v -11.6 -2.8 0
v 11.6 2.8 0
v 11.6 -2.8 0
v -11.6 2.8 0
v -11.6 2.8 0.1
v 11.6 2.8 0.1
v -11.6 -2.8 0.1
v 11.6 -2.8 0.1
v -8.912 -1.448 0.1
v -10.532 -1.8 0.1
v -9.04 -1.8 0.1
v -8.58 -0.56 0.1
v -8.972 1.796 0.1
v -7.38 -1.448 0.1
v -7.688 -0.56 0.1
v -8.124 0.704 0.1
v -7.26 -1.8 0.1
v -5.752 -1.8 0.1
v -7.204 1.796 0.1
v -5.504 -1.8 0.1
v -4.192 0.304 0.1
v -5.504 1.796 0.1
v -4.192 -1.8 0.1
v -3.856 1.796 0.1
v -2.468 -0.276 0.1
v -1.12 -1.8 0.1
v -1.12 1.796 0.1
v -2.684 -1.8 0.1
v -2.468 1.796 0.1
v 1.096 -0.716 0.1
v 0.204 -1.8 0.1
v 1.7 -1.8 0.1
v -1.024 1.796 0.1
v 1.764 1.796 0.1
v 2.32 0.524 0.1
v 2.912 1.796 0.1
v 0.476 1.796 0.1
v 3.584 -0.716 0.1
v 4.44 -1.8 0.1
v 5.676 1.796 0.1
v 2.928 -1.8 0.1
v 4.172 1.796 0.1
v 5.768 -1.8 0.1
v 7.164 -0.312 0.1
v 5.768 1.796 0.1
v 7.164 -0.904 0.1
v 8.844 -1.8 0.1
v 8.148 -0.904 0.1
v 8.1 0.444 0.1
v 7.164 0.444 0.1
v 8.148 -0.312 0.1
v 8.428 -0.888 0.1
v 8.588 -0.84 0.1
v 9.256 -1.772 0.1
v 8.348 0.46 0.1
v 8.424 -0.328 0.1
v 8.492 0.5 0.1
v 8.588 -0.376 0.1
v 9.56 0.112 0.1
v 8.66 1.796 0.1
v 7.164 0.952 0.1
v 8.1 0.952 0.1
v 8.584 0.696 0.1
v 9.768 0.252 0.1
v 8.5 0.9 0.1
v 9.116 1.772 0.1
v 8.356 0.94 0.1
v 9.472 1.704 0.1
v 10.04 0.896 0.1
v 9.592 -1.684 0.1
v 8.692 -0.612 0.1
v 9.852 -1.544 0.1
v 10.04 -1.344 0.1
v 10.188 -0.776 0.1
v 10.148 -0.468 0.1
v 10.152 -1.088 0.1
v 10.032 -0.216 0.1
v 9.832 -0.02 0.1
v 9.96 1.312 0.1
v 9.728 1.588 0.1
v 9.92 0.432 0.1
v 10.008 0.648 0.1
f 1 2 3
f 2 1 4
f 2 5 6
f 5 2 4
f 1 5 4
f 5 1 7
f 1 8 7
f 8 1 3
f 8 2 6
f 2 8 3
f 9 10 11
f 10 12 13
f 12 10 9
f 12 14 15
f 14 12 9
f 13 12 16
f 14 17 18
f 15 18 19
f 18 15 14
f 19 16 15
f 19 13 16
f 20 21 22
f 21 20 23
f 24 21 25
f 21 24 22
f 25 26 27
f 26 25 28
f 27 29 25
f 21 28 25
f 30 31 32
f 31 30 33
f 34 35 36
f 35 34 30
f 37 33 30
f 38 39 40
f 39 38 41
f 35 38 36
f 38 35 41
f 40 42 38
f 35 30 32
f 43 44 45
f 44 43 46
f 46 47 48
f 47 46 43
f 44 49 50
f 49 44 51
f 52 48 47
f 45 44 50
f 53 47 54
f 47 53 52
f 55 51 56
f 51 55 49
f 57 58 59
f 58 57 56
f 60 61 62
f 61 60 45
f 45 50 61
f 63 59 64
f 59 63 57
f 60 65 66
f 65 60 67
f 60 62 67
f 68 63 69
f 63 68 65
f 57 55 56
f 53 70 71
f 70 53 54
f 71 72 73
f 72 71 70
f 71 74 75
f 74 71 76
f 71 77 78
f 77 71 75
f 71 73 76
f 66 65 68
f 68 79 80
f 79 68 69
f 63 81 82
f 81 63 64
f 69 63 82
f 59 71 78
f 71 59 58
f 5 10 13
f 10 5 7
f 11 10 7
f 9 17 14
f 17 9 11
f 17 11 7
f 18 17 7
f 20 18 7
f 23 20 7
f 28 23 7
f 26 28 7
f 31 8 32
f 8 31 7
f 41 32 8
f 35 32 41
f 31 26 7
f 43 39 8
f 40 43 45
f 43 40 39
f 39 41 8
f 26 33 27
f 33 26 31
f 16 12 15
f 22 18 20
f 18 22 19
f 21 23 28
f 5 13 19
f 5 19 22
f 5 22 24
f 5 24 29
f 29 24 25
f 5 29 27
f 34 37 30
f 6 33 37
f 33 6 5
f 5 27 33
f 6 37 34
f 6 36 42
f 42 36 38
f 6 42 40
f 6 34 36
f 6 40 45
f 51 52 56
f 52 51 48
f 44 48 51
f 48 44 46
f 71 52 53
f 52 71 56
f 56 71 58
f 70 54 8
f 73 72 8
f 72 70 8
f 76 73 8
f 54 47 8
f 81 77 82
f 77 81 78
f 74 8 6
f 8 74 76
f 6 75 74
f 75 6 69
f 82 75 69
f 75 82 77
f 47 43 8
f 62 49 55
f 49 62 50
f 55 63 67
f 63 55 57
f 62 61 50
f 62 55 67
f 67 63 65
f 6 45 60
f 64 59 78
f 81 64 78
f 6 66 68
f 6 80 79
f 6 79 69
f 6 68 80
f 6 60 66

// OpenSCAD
// file: ../p/box5-12.scad
use <../lib.scad>
function ldraw_lib__box5_12() = [
// 0 Box with 5 Faces without Any Edges
// 0 Name: box5-12.dat
// 0 Author: Chris Dee [cwdee]
// 0 !LDRAW_ORG Primitive UPDATE 2009-02
// 0 !LICENSE Licensed under CC BY 2.0 and CC BY 4.0 : see CAreadme.txt
// 
// 0 BFC CERTIFY CCW
  [0,"BFC","CERTIFY"],
  [0,"BFC","CCW"],
// 
// 0 !HISTORY 2009-09-03 [PTadmin] Official Update 2009-02
// 
// 
// 4 16 1 1 1 1 1 -1 -1 1 -1 -1 1 1
  [4,16,1,1,1,1,1,-1,-1,1,-1,-1,1,1],
// 4 16 -1 0 1 1 0 1 1 1 1 -1 1 1
  [4,16,-1,0,1,1,0,1,1,1,1,-1,1,1],
// 4 16 -1 0 -1 -1 0 1 -1 1 1 -1 1 -1
  [4,16,-1,0,-1,-1,0,1,-1,1,1,-1,1,-1],
// 4 16 1 0 -1 -1 0 -1 -1 1 -1 1 1 -1
  [4,16,1,0,-1,-1,0,-1,-1,1,-1,1,1,-1],
// 4 16 1 0 1 1 0 -1 1 1 -1 1 1 1
  [4,16,1,0,1,1,0,-1,1,1,-1,1,1,1],
// 0
];
module ldraw_lib__box5_12(step=0, col=false, unit=2/5, alt=false, line=0.2, solid=!$preview)
    makepoly(ldraw_lib__box5_12(), step=step, col=col, unit=unit, alt=alt, line=line, solid=solid);
ldraw_lib__box5_12(line=0.2);
// main file
use <../lib.scad>
use <../p/box5-12.scad>
function ldraw_lib__194535e() = [
// 0 Sticker  0.7 x  2.9 with Black "ANWB" on Transparent Background
// 0 Name: 194535e.dat
// 0 Author: Takeshi Takahashi [RainbowDolphin]
// 0 !LDRAW_ORG Part UPDATE 2023-01
// 0 !LICENSE Licensed under CC BY 2.0 and CC BY 4.0 : see CAreadme.txt
// 
// 0 BFC CERTIFY CCW
  [0,"BFC","CERTIFY"],
  [0,"BFC","CCW"],
// 
// 0 !KEYWORDS Bricklink 1590.2stk01, Brickowl 599539, Netherlands
// 0 !KEYWORDS Rebrickable 194535, Road service, Set 1590-2
// 
// 0 !HISTORY 2023-03-05 [OrionP] Official Update 2023-01
// 
// 
// 1 16 0 -0.25 0 29 0 0 0 0.25 0 0 0 7 box5-12.dat
  [1,16,0,-0.25,0,29,0,0,0,0.25,0,0,0,7, ldraw_lib__box5_12()],
// 0 BFC NOCLIP
  [0,"BFC","NOCLIP"],
// 3 0 -22.28 -0.25 -3.62 -26.33 -0.25 -4.5 -22.6 -0.25 -4.5
  [3,0,-22.28,-0.25,-3.62,-26.33,-0.25,-4.5,-22.6,-0.25,-4.5],
// 4 0 -21.45 -0.25 -1.4 -22.43 -0.25 4.49 -26.33 -0.25 -4.5 -22.28 -0.25 -3.62
  [4,0,-21.45,-0.25,-1.4,-22.43,-0.25,4.49,-26.33,-0.25,-4.5,-22.28,-0.25,-3.62],
// 4 0 -21.45 -0.25 -1.4 -22.28 -0.25 -3.62 -18.45 -0.25 -3.62 -19.22 -0.25 -1.4
  [4,0,-21.45,-0.25,-1.4,-22.28,-0.25,-3.62,-18.45,-0.25,-3.62,-19.22,-0.25,-1.4],
// 3 0 -22.43 -0.25 4.49 -21.45 -0.25 -1.4 -20.31 -0.25 1.76
  [3,0,-22.43,-0.25,4.49,-21.45,-0.25,-1.4,-20.31,-0.25,1.76],
// 3 0 -18.45 -0.25 -3.62 -18.15 -0.25 -4.5 -14.38 -0.25 -4.5
  [3,0,-18.45,-0.25,-3.62,-18.15,-0.25,-4.5,-14.38,-0.25,-4.5],
// 4 0 -19.22 -0.25 -1.4 -18.45 -0.25 -3.62 -14.38 -0.25 -4.5 -18.01 -0.25 4.49
  [4,0,-19.22,-0.25,-1.4,-18.45,-0.25,-3.62,-14.38,-0.25,-4.5,-18.01,-0.25,4.49],
// 3 0 -18.01 -0.25 4.49 -20.31 -0.25 1.76 -19.22 -0.25 -1.4
  [3,0,-18.01,-0.25,4.49,-20.31,-0.25,1.76,-19.22,-0.25,-1.4],
// 3 0 -18.01 -0.25 4.49 -22.43 -0.25 4.49 -20.31 -0.25 1.76
  [3,0,-18.01,-0.25,4.49,-22.43,-0.25,4.49,-20.31,-0.25,1.76],
// 4 0 -13.76 -0.25 -4.5 -10.48 -0.25 -4.5 -10.48 -0.25 0.76 -13.76 -0.25 4.49
  [4,0,-13.76,-0.25,-4.5,-10.48,-0.25,-4.5,-10.48,-0.25,0.76,-13.76,-0.25,4.49],
// 4 0 -9.64 -0.25 4.49 -13.76 -0.25 4.49 -10.48 -0.25 0.76 -6.17 -0.25 -0.69
  [4,0,-9.64,-0.25,4.49,-13.76,-0.25,4.49,-10.48,-0.25,0.76,-6.17,-0.25,-0.69],
// 4 0 -6.17 -0.25 -0.69 -6.71 -0.25 -4.5 -2.8 -0.25 -4.5 -2.8 -0.25 4.49
  [4,0,-6.17,-0.25,-0.69,-6.71,-0.25,-4.5,-2.8,-0.25,-4.5,-2.8,-0.25,4.49],
// 3 0 -2.8 -0.25 4.49 -6.17 -0.25 4.49 -6.17 -0.25 -0.69
  [3,0,-2.8,-0.25,4.49,-6.17,-0.25,4.49,-6.17,-0.25,-0.69],
// 3 0 -10.48 -0.25 0.76 -6.71 -0.25 -4.5 -6.17 -0.25 -0.69
  [3,0,-10.48,-0.25,0.76,-6.71,-0.25,-4.5,-6.17,-0.25,-0.69],
// 4 0 0.51 -0.25 -4.5 4.25 -0.25 -4.5 2.74 -0.25 -1.79 -2.56 -0.25 4.49
  [4,0,0.51,-0.25,-4.5,4.25,-0.25,-4.5,2.74,-0.25,-1.79,-2.56,-0.25,4.49],
// 4 0 4.41 -0.25 4.49 2.74 -0.25 -1.79 5.8 -0.25 1.31 7.28 -0.25 4.49
  [4,0,4.41,-0.25,4.49,2.74,-0.25,-1.79,5.8,-0.25,1.31,7.28,-0.25,4.49],
// 3 0 1.19 -0.25 4.49 -2.56 -0.25 4.49 2.74 -0.25 -1.79
  [3,0,1.19,-0.25,4.49,-2.56,-0.25,4.49,2.74,-0.25,-1.79],
// 4 0 8.96 -0.25 -1.79 7.32 -0.25 -4.5 11.1 -0.25 -4.5 14.19 -0.25 4.49
  [4,0,8.96,-0.25,-1.79,7.32,-0.25,-4.5,11.1,-0.25,-4.5,14.19,-0.25,4.49],
// 4 0 5.8 -0.25 1.31 7.32 -0.25 -4.5 8.96 -0.25 -1.79 7.28 -0.25 4.49
  [4,0,5.8,-0.25,1.31,7.32,-0.25,-4.5,8.96,-0.25,-1.79,7.28,-0.25,4.49],
// 3 0 14.19 -0.25 4.49 10.43 -0.25 4.49 8.96 -0.25 -1.79
  [3,0,14.19,-0.25,4.49,10.43,-0.25,4.49,8.96,-0.25,-1.79],
// 3 0 5.8 -0.25 1.31 2.74 -0.25 -1.79 4.25 -0.25 -4.5
  [3,0,5.8,-0.25,1.31,2.74,-0.25,-1.79,4.25,-0.25,-4.5],
// 4 0 14.42 -0.25 -4.5 17.91 -0.25 -2.26 17.91 -0.25 -0.78 14.42 -0.25 4.49
  [4,0,14.42,-0.25,-4.5,17.91,-0.25,-2.26,17.91,-0.25,-0.78,14.42,-0.25,4.49],
// 4 0 22.11 -0.25 -4.5 20.37 -0.25 -2.26 17.91 -0.25 -2.26 14.42 -0.25 -4.5
  [4,0,22.11,-0.25,-4.5,20.37,-0.25,-2.26,17.91,-0.25,-2.26,14.42,-0.25,-4.5],
// 4 0 20.25 -0.25 1.11 17.91 -0.25 1.11 17.91 -0.25 -0.78 20.37 -0.25 -0.78
  [4,0,20.25,-0.25,1.11,17.91,-0.25,1.11,17.91,-0.25,-0.78,20.37,-0.25,-0.78],
// 3 0 21.07 -0.25 -2.22 20.37 -0.25 -2.26 22.11 -0.25 -4.5
  [3,0,21.07,-0.25,-2.22,20.37,-0.25,-2.26,22.11,-0.25,-4.5],
// 3 0 14.42 -0.25 4.49 17.91 -0.25 -0.78 17.91 -0.25 1.11
  [3,0,14.42,-0.25,4.49,17.91,-0.25,-0.78,17.91,-0.25,1.11],
// 4 0 21.47 -0.25 -2.1 21.07 -0.25 -2.22 22.11 -0.25 -4.5 23.14 -0.25 -4.43
  [4,0,21.47,-0.25,-2.1,21.07,-0.25,-2.22,22.11,-0.25,-4.5,23.14,-0.25,-4.43],
// 4 0 20.37 -0.25 -0.78 21.06 -0.25 -0.82 20.87 -0.25 1.15 20.25 -0.25 1.11
  [4,0,20.37,-0.25,-0.78,21.06,-0.25,-0.82,20.87,-0.25,1.15,20.25,-0.25,1.11],
// 4 0 21.47 -0.25 -0.94 23.9 -0.25 0.28 21.23 -0.25 1.25 21.06 -0.25 -0.82
  [4,0,21.47,-0.25,-0.94,23.9,-0.25,0.28,21.23,-0.25,1.25,21.06,-0.25,-0.82],
// 4 0 21.65 -0.25 4.49 14.42 -0.25 4.49 17.91 -0.25 2.38 20.25 -0.25 2.38
  [4,0,21.65,-0.25,4.49,14.42,-0.25,4.49,17.91,-0.25,2.38,20.25,-0.25,2.38],
// 3 0 14.42 -0.25 4.49 17.91 -0.25 1.11 17.91 -0.25 2.38
  [3,0,14.42,-0.25,4.49,17.91,-0.25,1.11,17.91,-0.25,2.38],
// 4 0 21.46 -0.25 1.74 21.23 -0.25 1.25 23.9 -0.25 0.28 24.42 -0.25 0.63
  [4,0,21.46,-0.25,1.74,21.23,-0.25,1.25,23.9,-0.25,0.28,24.42,-0.25,0.63],
// 4 0 21.65 -0.25 4.49 20.89 -0.25 2.35 21.25 -0.25 2.25 22.79 -0.25 4.43
  [4,0,21.65,-0.25,4.49,20.89,-0.25,2.35,21.25,-0.25,2.25,22.79,-0.25,4.43],
// 3 0 21.65 -0.25 4.49 20.25 -0.25 2.38 20.89 -0.25 2.35
  [3,0,21.65,-0.25,4.49,20.25,-0.25,2.38,20.89,-0.25,2.35],
// 4 0 23.68 -0.25 4.26 21.25 -0.25 2.25 21.46 -0.25 1.74 25.1 -0.25 2.24
  [4,0,23.68,-0.25,4.26,21.25,-0.25,2.25,21.46,-0.25,1.74,25.1,-0.25,2.24],
// 3 0 21.23 -0.25 1.25 20.87 -0.25 1.15 21.06 -0.25 -0.82
  [3,0,21.23,-0.25,1.25,20.87,-0.25,1.15,21.06,-0.25,-0.82],
// 4 0 21.47 -0.25 -2.1 23.14 -0.25 -4.43 23.98 -0.25 -4.21 21.73 -0.25 -1.53
  [4,0,21.47,-0.25,-2.1,23.14,-0.25,-4.43,23.98,-0.25,-4.21,21.73,-0.25,-1.53],
// 4 0 21.73 -0.25 -1.53 23.98 -0.25 -4.21 24.63 -0.25 -3.86 25.1 -0.25 -3.36
  [4,0,21.73,-0.25,-1.53,23.98,-0.25,-4.21,24.63,-0.25,-3.86,25.1,-0.25,-3.36],
// 4 0 21.73 -0.25 -1.53 25.38 -0.25 -2.72 25.47 -0.25 -1.94 25.37 -0.25 -1.17
  [4,0,21.73,-0.25,-1.53,25.38,-0.25,-2.72,25.47,-0.25,-1.94,25.37,-0.25,-1.17],
// 4 0 21.73 -0.25 -1.53 25.37 -0.25 -1.17 25.08 -0.25 -0.54 24.58 -0.25 -0.05
  [4,0,21.73,-0.25,-1.53,25.37,-0.25,-1.17,25.08,-0.25,-0.54,24.58,-0.25,-0.05],
// 3 0 21.73 -0.25 -1.53 25.1 -0.25 -3.36 25.38 -0.25 -2.72
  [3,0,21.73,-0.25,-1.53,25.1,-0.25,-3.36,25.38,-0.25,-2.72],
// 3 0 22.79 -0.25 4.43 21.25 -0.25 2.25 23.68 -0.25 4.26
  [3,0,22.79,-0.25,4.43,21.25,-0.25,2.25,23.68,-0.25,4.26],
// 4 0 24.9 -0.25 3.28 24.32 -0.25 3.97 23.68 -0.25 4.26 25.1 -0.25 2.24
  [4,0,24.9,-0.25,3.28,24.32,-0.25,3.97,23.68,-0.25,4.26,25.1,-0.25,2.24],
// 4 0 21.46 -0.25 1.74 24.42 -0.25 0.63 24.8 -0.25 1.08 25.02 -0.25 1.62
  [4,0,21.46,-0.25,1.74,24.42,-0.25,0.63,24.8,-0.25,1.08,25.02,-0.25,1.62],
// 3 0 25.1 -0.25 2.24 21.46 -0.25 1.74 25.02 -0.25 1.62
  [3,0,25.1,-0.25,2.24,21.46,-0.25,1.74,25.02,-0.25,1.62],
// 4 0 21.73 -0.25 -1.53 24.58 -0.25 -0.05 23.9 -0.25 0.28 21.47 -0.25 -0.94
  [4,0,21.73,-0.25,-1.53,24.58,-0.25,-0.05,23.9,-0.25,0.28,21.47,-0.25,-0.94],
// 0 BFC CLIP
  [0,"BFC","CLIP"],
// 4 16 -29 -0.25 7 -29 -0.25 -7 -26.33 -0.25 -4.5 -22.43 -0.25 4.49
  [4,16,-29,-0.25,7,-29,-0.25,-7,-26.33,-0.25,-4.5,-22.43,-0.25,4.49],
// 3 16 -22.6 -0.25 -4.5 -26.33 -0.25 -4.5 -29 -0.25 -7
  [3,16,-22.6,-0.25,-4.5,-26.33,-0.25,-4.5,-29,-0.25,-7],
// 4 16 -22.28 -0.25 -3.62 -22.6 -0.25 -4.5 -18.15 -0.25 -4.5 -18.45 -0.25 -3.62
  [4,16,-22.28,-0.25,-3.62,-22.6,-0.25,-4.5,-18.15,-0.25,-4.5,-18.45,-0.25,-3.62],
// 3 16 -18.15 -0.25 -4.5 -22.6 -0.25 -4.5 -29 -0.25 -7
  [3,16,-18.15,-0.25,-4.5,-22.6,-0.25,-4.5,-29,-0.25,-7],
// 3 16 -14.38 -0.25 -4.5 -18.15 -0.25 -4.5 -29 -0.25 -7
  [3,16,-14.38,-0.25,-4.5,-18.15,-0.25,-4.5,-29,-0.25,-7],
// 3 16 -13.76 -0.25 -4.5 -14.38 -0.25 -4.5 -29 -0.25 -7
  [3,16,-13.76,-0.25,-4.5,-14.38,-0.25,-4.5,-29,-0.25,-7],
// 3 16 -10.48 -0.25 -4.5 -13.76 -0.25 -4.5 -29 -0.25 -7
  [3,16,-10.48,-0.25,-4.5,-13.76,-0.25,-4.5,-29,-0.25,-7],
// 3 16 -6.71 -0.25 -4.5 -10.48 -0.25 -4.5 -29 -0.25 -7
  [3,16,-6.71,-0.25,-4.5,-10.48,-0.25,-4.5,-29,-0.25,-7],
// 3 16 -2.8 -0.25 -4.5 -6.71 -0.25 -4.5 -29 -0.25 -7
  [3,16,-2.8,-0.25,-4.5,-6.71,-0.25,-4.5,-29,-0.25,-7],
// 4 16 29 -0.25 -7 4.25 -0.25 -4.5 0.51 -0.25 -4.5 -29 -0.25 -7
  [4,16,29,-0.25,-7,4.25,-0.25,-4.5,0.51,-0.25,-4.5,-29,-0.25,-7],
// 3 16 7.32 -0.25 -4.5 4.25 -0.25 -4.5 29 -0.25 -7
  [3,16,7.32,-0.25,-4.5,4.25,-0.25,-4.5,29,-0.25,-7],
// 3 16 5.8 -0.25 1.31 4.25 -0.25 -4.5 7.32 -0.25 -4.5
  [3,16,5.8,-0.25,1.31,4.25,-0.25,-4.5,7.32,-0.25,-4.5],
// 3 16 0.51 -0.25 -4.5 -2.8 -0.25 -4.5 -29 -0.25 -7
  [3,16,0.51,-0.25,-4.5,-2.8,-0.25,-4.5,-29,-0.25,-7],
// 3 16 14.42 -0.25 -4.5 11.1 -0.25 -4.5 29 -0.25 -7
  [3,16,14.42,-0.25,-4.5,11.1,-0.25,-4.5,29,-0.25,-7],
// 4 16 14.19 -0.25 4.49 11.1 -0.25 -4.5 14.42 -0.25 -4.5 14.42 -0.25 4.49
  [4,16,14.19,-0.25,4.49,11.1,-0.25,-4.5,14.42,-0.25,-4.5,14.42,-0.25,4.49],
// 3 16 11.1 -0.25 -4.5 7.32 -0.25 -4.5 29 -0.25 -7
  [3,16,11.1,-0.25,-4.5,7.32,-0.25,-4.5,29,-0.25,-7],
// 4 16 -2.8 -0.25 -4.5 0.51 -0.25 -4.5 -2.56 -0.25 4.49 -2.8 -0.25 4.49
  [4,16,-2.8,-0.25,-4.5,0.51,-0.25,-4.5,-2.56,-0.25,4.49,-2.8,-0.25,4.49],
// 3 16 -20.31 -0.25 1.76 -21.45 -0.25 -1.4 -19.22 -0.25 -1.4
  [3,16,-20.31,-0.25,1.76,-21.45,-0.25,-1.4,-19.22,-0.25,-1.4],
// 4 16 -14.38 -0.25 -4.5 -13.76 -0.25 -4.5 -13.76 -0.25 4.49 -18.01 -0.25 4.49
  [4,16,-14.38,-0.25,-4.5,-13.76,-0.25,-4.5,-13.76,-0.25,4.49,-18.01,-0.25,4.49],
// 3 16 -10.48 -0.25 0.76 -10.48 -0.25 -4.5 -6.71 -0.25 -4.5
  [3,16,-10.48,-0.25,0.76,-10.48,-0.25,-4.5,-6.71,-0.25,-4.5],
// 3 16 -29 -0.25 7 -22.43 -0.25 4.49 -18.01 -0.25 4.49
  [3,16,-29,-0.25,7,-22.43,-0.25,4.49,-18.01,-0.25,4.49],
// 3 16 -29 -0.25 7 -18.01 -0.25 4.49 -13.76 -0.25 4.49
  [3,16,-29,-0.25,7,-18.01,-0.25,4.49,-13.76,-0.25,4.49],
// 3 16 -29 -0.25 7 -13.76 -0.25 4.49 -9.64 -0.25 4.49
  [3,16,-29,-0.25,7,-13.76,-0.25,4.49,-9.64,-0.25,4.49],
// 3 16 -29 -0.25 7 -9.64 -0.25 4.49 -6.17 -0.25 4.49
  [3,16,-29,-0.25,7,-9.64,-0.25,4.49,-6.17,-0.25,4.49],
// 3 16 -6.17 -0.25 4.49 -9.64 -0.25 4.49 -6.17 -0.25 -0.69
  [3,16,-6.17,-0.25,4.49,-9.64,-0.25,4.49,-6.17,-0.25,-0.69],
// 3 16 -29 -0.25 7 -6.17 -0.25 4.49 -2.8 -0.25 4.49
  [3,16,-29,-0.25,7,-6.17,-0.25,4.49,-2.8,-0.25,4.49],
// 3 16 4.41 -0.25 4.49 1.19 -0.25 4.49 2.74 -0.25 -1.79
  [3,16,4.41,-0.25,4.49,1.19,-0.25,4.49,2.74,-0.25,-1.79],
// 4 16 -29 -0.25 7 -2.56 -0.25 4.49 1.19 -0.25 4.49 29 -0.25 7
  [4,16,-29,-0.25,7,-2.56,-0.25,4.49,1.19,-0.25,4.49,29,-0.25,7],
// 3 16 -29 -0.25 7 -2.8 -0.25 4.49 -2.56 -0.25 4.49
  [3,16,-29,-0.25,7,-2.8,-0.25,4.49,-2.56,-0.25,4.49],
// 3 16 29 -0.25 7 1.19 -0.25 4.49 4.41 -0.25 4.49
  [3,16,29,-0.25,7,1.19,-0.25,4.49,4.41,-0.25,4.49],
// 3 16 29 -0.25 7 7.28 -0.25 4.49 10.43 -0.25 4.49
  [3,16,29,-0.25,7,7.28,-0.25,4.49,10.43,-0.25,4.49],
// 3 16 10.43 -0.25 4.49 7.28 -0.25 4.49 8.96 -0.25 -1.79
  [3,16,10.43,-0.25,4.49,7.28,-0.25,4.49,8.96,-0.25,-1.79],
// 3 16 29 -0.25 7 10.43 -0.25 4.49 14.19 -0.25 4.49
  [3,16,29,-0.25,7,10.43,-0.25,4.49,14.19,-0.25,4.49],
// 3 16 29 -0.25 7 4.41 -0.25 4.49 7.28 -0.25 4.49
  [3,16,29,-0.25,7,4.41,-0.25,4.49,7.28,-0.25,4.49],
// 3 16 29 -0.25 7 14.19 -0.25 4.49 14.42 -0.25 4.49
  [3,16,29,-0.25,7,14.19,-0.25,4.49,14.42,-0.25,4.49],
// 4 16 20.37 -0.25 -2.26 21.07 -0.25 -2.22 21.06 -0.25 -0.82 20.37 -0.25 -0.78
  [4,16,20.37,-0.25,-2.26,21.07,-0.25,-2.22,21.06,-0.25,-0.82,20.37,-0.25,-0.78],
// 4 16 17.91 -0.25 -0.78 17.91 -0.25 -2.26 20.37 -0.25 -2.26 20.37 -0.25 -0.78
  [4,16,17.91,-0.25,-0.78,17.91,-0.25,-2.26,20.37,-0.25,-2.26,20.37,-0.25,-0.78],
// 4 16 21.07 -0.25 -2.22 21.47 -0.25 -2.1 21.73 -0.25 -1.53 21.06 -0.25 -0.82
  [4,16,21.07,-0.25,-2.22,21.47,-0.25,-2.1,21.73,-0.25,-1.53,21.06,-0.25,-0.82],
// 3 16 21.06 -0.25 -0.82 21.73 -0.25 -1.53 21.47 -0.25 -0.94
  [3,16,21.06,-0.25,-0.82,21.73,-0.25,-1.53,21.47,-0.25,-0.94],
// 3 16 23.98 -0.25 -4.21 23.14 -0.25 -4.43 29 -0.25 -7
  [3,16,23.98,-0.25,-4.21,23.14,-0.25,-4.43,29,-0.25,-7],
// 3 16 25.1 -0.25 -3.36 24.63 -0.25 -3.86 29 -0.25 -7
  [3,16,25.1,-0.25,-3.36,24.63,-0.25,-3.86,29,-0.25,-7],
// 3 16 24.63 -0.25 -3.86 23.98 -0.25 -4.21 29 -0.25 -7
  [3,16,24.63,-0.25,-3.86,23.98,-0.25,-4.21,29,-0.25,-7],
// 3 16 25.38 -0.25 -2.72 25.1 -0.25 -3.36 29 -0.25 -7
  [3,16,25.38,-0.25,-2.72,25.1,-0.25,-3.36,29,-0.25,-7],
// 3 16 23.14 -0.25 -4.43 22.11 -0.25 -4.5 29 -0.25 -7
  [3,16,23.14,-0.25,-4.43,22.11,-0.25,-4.5,29,-0.25,-7],
// 4 16 24.8 -0.25 1.08 24.58 -0.25 -0.05 25.08 -0.25 -0.54 25.02 -0.25 1.62
  [4,16,24.8,-0.25,1.08,24.58,-0.25,-0.05,25.08,-0.25,-0.54,25.02,-0.25,1.62],
// 4 16 25.47 -0.25 -1.94 25.38 -0.25 -2.72 29 -0.25 -7 29 -0.25 7
  [4,16,25.47,-0.25,-1.94,25.38,-0.25,-2.72,29,-0.25,-7,29,-0.25,7],
// 4 16 25.37 -0.25 -1.17 25.47 -0.25 -1.94 29 -0.25 7 25.1 -0.25 2.24
  [4,16,25.37,-0.25,-1.17,25.47,-0.25,-1.94,29,-0.25,7,25.1,-0.25,2.24],
// 4 16 25.02 -0.25 1.62 25.08 -0.25 -0.54 25.37 -0.25 -1.17 25.1 -0.25 2.24
  [4,16,25.02,-0.25,1.62,25.08,-0.25,-0.54,25.37,-0.25,-1.17,25.1,-0.25,2.24],
// 3 16 22.11 -0.25 -4.5 14.42 -0.25 -4.5 29 -0.25 -7
  [3,16,22.11,-0.25,-4.5,14.42,-0.25,-4.5,29,-0.25,-7],
// 4 16 20.25 -0.25 2.38 17.91 -0.25 1.11 20.25 -0.25 1.11 20.87 -0.25 1.15
  [4,16,20.25,-0.25,2.38,17.91,-0.25,1.11,20.25,-0.25,1.11,20.87,-0.25,1.15],
// 4 16 20.87 -0.25 1.15 21.23 -0.25 1.25 21.46 -0.25 1.74 20.89 -0.25 2.35
  [4,16,20.87,-0.25,1.15,21.23,-0.25,1.25,21.46,-0.25,1.74,20.89,-0.25,2.35],
// 3 16 20.25 -0.25 2.38 17.91 -0.25 2.38 17.91 -0.25 1.11
  [3,16,20.25,-0.25,2.38,17.91,-0.25,2.38,17.91,-0.25,1.11],
// 3 16 20.25 -0.25 2.38 20.87 -0.25 1.15 20.89 -0.25 2.35
  [3,16,20.25,-0.25,2.38,20.87,-0.25,1.15,20.89,-0.25,2.35],
// 3 16 20.89 -0.25 2.35 21.46 -0.25 1.74 21.25 -0.25 2.25
  [3,16,20.89,-0.25,2.35,21.46,-0.25,1.74,21.25,-0.25,2.25],
// 3 16 29 -0.25 7 14.42 -0.25 4.49 21.65 -0.25 4.49
  [3,16,29,-0.25,7,14.42,-0.25,4.49,21.65,-0.25,4.49],
// 3 16 24.42 -0.25 0.63 23.9 -0.25 0.28 24.58 -0.25 -0.05
  [3,16,24.42,-0.25,0.63,23.9,-0.25,0.28,24.58,-0.25,-0.05],
// 3 16 24.8 -0.25 1.08 24.42 -0.25 0.63 24.58 -0.25 -0.05
  [3,16,24.8,-0.25,1.08,24.42,-0.25,0.63,24.58,-0.25,-0.05],
// 3 16 29 -0.25 7 22.79 -0.25 4.43 23.68 -0.25 4.26
  [3,16,29,-0.25,7,22.79,-0.25,4.43,23.68,-0.25,4.26],
// 3 16 29 -0.25 7 24.32 -0.25 3.97 24.9 -0.25 3.28
  [3,16,29,-0.25,7,24.32,-0.25,3.97,24.9,-0.25,3.28],
// 3 16 29 -0.25 7 24.9 -0.25 3.28 25.1 -0.25 2.24
  [3,16,29,-0.25,7,24.9,-0.25,3.28,25.1,-0.25,2.24],
// 3 16 29 -0.25 7 23.68 -0.25 4.26 24.32 -0.25 3.97
  [3,16,29,-0.25,7,23.68,-0.25,4.26,24.32,-0.25,3.97],
// 3 16 29 -0.25 7 21.65 -0.25 4.49 22.79 -0.25 4.43
  [3,16,29,-0.25,7,21.65,-0.25,4.49,22.79,-0.25,4.43],
];
module ldraw_lib__194535e(step=0, col=false, unit=2/5, alt=false, line=0.2, solid=!$preview)
    makepoly(ldraw_lib__194535e(), step=step, col=col, unit=unit, alt=alt, line=line, solid=solid);
ldraw_lib__194535e(line=0.2);
